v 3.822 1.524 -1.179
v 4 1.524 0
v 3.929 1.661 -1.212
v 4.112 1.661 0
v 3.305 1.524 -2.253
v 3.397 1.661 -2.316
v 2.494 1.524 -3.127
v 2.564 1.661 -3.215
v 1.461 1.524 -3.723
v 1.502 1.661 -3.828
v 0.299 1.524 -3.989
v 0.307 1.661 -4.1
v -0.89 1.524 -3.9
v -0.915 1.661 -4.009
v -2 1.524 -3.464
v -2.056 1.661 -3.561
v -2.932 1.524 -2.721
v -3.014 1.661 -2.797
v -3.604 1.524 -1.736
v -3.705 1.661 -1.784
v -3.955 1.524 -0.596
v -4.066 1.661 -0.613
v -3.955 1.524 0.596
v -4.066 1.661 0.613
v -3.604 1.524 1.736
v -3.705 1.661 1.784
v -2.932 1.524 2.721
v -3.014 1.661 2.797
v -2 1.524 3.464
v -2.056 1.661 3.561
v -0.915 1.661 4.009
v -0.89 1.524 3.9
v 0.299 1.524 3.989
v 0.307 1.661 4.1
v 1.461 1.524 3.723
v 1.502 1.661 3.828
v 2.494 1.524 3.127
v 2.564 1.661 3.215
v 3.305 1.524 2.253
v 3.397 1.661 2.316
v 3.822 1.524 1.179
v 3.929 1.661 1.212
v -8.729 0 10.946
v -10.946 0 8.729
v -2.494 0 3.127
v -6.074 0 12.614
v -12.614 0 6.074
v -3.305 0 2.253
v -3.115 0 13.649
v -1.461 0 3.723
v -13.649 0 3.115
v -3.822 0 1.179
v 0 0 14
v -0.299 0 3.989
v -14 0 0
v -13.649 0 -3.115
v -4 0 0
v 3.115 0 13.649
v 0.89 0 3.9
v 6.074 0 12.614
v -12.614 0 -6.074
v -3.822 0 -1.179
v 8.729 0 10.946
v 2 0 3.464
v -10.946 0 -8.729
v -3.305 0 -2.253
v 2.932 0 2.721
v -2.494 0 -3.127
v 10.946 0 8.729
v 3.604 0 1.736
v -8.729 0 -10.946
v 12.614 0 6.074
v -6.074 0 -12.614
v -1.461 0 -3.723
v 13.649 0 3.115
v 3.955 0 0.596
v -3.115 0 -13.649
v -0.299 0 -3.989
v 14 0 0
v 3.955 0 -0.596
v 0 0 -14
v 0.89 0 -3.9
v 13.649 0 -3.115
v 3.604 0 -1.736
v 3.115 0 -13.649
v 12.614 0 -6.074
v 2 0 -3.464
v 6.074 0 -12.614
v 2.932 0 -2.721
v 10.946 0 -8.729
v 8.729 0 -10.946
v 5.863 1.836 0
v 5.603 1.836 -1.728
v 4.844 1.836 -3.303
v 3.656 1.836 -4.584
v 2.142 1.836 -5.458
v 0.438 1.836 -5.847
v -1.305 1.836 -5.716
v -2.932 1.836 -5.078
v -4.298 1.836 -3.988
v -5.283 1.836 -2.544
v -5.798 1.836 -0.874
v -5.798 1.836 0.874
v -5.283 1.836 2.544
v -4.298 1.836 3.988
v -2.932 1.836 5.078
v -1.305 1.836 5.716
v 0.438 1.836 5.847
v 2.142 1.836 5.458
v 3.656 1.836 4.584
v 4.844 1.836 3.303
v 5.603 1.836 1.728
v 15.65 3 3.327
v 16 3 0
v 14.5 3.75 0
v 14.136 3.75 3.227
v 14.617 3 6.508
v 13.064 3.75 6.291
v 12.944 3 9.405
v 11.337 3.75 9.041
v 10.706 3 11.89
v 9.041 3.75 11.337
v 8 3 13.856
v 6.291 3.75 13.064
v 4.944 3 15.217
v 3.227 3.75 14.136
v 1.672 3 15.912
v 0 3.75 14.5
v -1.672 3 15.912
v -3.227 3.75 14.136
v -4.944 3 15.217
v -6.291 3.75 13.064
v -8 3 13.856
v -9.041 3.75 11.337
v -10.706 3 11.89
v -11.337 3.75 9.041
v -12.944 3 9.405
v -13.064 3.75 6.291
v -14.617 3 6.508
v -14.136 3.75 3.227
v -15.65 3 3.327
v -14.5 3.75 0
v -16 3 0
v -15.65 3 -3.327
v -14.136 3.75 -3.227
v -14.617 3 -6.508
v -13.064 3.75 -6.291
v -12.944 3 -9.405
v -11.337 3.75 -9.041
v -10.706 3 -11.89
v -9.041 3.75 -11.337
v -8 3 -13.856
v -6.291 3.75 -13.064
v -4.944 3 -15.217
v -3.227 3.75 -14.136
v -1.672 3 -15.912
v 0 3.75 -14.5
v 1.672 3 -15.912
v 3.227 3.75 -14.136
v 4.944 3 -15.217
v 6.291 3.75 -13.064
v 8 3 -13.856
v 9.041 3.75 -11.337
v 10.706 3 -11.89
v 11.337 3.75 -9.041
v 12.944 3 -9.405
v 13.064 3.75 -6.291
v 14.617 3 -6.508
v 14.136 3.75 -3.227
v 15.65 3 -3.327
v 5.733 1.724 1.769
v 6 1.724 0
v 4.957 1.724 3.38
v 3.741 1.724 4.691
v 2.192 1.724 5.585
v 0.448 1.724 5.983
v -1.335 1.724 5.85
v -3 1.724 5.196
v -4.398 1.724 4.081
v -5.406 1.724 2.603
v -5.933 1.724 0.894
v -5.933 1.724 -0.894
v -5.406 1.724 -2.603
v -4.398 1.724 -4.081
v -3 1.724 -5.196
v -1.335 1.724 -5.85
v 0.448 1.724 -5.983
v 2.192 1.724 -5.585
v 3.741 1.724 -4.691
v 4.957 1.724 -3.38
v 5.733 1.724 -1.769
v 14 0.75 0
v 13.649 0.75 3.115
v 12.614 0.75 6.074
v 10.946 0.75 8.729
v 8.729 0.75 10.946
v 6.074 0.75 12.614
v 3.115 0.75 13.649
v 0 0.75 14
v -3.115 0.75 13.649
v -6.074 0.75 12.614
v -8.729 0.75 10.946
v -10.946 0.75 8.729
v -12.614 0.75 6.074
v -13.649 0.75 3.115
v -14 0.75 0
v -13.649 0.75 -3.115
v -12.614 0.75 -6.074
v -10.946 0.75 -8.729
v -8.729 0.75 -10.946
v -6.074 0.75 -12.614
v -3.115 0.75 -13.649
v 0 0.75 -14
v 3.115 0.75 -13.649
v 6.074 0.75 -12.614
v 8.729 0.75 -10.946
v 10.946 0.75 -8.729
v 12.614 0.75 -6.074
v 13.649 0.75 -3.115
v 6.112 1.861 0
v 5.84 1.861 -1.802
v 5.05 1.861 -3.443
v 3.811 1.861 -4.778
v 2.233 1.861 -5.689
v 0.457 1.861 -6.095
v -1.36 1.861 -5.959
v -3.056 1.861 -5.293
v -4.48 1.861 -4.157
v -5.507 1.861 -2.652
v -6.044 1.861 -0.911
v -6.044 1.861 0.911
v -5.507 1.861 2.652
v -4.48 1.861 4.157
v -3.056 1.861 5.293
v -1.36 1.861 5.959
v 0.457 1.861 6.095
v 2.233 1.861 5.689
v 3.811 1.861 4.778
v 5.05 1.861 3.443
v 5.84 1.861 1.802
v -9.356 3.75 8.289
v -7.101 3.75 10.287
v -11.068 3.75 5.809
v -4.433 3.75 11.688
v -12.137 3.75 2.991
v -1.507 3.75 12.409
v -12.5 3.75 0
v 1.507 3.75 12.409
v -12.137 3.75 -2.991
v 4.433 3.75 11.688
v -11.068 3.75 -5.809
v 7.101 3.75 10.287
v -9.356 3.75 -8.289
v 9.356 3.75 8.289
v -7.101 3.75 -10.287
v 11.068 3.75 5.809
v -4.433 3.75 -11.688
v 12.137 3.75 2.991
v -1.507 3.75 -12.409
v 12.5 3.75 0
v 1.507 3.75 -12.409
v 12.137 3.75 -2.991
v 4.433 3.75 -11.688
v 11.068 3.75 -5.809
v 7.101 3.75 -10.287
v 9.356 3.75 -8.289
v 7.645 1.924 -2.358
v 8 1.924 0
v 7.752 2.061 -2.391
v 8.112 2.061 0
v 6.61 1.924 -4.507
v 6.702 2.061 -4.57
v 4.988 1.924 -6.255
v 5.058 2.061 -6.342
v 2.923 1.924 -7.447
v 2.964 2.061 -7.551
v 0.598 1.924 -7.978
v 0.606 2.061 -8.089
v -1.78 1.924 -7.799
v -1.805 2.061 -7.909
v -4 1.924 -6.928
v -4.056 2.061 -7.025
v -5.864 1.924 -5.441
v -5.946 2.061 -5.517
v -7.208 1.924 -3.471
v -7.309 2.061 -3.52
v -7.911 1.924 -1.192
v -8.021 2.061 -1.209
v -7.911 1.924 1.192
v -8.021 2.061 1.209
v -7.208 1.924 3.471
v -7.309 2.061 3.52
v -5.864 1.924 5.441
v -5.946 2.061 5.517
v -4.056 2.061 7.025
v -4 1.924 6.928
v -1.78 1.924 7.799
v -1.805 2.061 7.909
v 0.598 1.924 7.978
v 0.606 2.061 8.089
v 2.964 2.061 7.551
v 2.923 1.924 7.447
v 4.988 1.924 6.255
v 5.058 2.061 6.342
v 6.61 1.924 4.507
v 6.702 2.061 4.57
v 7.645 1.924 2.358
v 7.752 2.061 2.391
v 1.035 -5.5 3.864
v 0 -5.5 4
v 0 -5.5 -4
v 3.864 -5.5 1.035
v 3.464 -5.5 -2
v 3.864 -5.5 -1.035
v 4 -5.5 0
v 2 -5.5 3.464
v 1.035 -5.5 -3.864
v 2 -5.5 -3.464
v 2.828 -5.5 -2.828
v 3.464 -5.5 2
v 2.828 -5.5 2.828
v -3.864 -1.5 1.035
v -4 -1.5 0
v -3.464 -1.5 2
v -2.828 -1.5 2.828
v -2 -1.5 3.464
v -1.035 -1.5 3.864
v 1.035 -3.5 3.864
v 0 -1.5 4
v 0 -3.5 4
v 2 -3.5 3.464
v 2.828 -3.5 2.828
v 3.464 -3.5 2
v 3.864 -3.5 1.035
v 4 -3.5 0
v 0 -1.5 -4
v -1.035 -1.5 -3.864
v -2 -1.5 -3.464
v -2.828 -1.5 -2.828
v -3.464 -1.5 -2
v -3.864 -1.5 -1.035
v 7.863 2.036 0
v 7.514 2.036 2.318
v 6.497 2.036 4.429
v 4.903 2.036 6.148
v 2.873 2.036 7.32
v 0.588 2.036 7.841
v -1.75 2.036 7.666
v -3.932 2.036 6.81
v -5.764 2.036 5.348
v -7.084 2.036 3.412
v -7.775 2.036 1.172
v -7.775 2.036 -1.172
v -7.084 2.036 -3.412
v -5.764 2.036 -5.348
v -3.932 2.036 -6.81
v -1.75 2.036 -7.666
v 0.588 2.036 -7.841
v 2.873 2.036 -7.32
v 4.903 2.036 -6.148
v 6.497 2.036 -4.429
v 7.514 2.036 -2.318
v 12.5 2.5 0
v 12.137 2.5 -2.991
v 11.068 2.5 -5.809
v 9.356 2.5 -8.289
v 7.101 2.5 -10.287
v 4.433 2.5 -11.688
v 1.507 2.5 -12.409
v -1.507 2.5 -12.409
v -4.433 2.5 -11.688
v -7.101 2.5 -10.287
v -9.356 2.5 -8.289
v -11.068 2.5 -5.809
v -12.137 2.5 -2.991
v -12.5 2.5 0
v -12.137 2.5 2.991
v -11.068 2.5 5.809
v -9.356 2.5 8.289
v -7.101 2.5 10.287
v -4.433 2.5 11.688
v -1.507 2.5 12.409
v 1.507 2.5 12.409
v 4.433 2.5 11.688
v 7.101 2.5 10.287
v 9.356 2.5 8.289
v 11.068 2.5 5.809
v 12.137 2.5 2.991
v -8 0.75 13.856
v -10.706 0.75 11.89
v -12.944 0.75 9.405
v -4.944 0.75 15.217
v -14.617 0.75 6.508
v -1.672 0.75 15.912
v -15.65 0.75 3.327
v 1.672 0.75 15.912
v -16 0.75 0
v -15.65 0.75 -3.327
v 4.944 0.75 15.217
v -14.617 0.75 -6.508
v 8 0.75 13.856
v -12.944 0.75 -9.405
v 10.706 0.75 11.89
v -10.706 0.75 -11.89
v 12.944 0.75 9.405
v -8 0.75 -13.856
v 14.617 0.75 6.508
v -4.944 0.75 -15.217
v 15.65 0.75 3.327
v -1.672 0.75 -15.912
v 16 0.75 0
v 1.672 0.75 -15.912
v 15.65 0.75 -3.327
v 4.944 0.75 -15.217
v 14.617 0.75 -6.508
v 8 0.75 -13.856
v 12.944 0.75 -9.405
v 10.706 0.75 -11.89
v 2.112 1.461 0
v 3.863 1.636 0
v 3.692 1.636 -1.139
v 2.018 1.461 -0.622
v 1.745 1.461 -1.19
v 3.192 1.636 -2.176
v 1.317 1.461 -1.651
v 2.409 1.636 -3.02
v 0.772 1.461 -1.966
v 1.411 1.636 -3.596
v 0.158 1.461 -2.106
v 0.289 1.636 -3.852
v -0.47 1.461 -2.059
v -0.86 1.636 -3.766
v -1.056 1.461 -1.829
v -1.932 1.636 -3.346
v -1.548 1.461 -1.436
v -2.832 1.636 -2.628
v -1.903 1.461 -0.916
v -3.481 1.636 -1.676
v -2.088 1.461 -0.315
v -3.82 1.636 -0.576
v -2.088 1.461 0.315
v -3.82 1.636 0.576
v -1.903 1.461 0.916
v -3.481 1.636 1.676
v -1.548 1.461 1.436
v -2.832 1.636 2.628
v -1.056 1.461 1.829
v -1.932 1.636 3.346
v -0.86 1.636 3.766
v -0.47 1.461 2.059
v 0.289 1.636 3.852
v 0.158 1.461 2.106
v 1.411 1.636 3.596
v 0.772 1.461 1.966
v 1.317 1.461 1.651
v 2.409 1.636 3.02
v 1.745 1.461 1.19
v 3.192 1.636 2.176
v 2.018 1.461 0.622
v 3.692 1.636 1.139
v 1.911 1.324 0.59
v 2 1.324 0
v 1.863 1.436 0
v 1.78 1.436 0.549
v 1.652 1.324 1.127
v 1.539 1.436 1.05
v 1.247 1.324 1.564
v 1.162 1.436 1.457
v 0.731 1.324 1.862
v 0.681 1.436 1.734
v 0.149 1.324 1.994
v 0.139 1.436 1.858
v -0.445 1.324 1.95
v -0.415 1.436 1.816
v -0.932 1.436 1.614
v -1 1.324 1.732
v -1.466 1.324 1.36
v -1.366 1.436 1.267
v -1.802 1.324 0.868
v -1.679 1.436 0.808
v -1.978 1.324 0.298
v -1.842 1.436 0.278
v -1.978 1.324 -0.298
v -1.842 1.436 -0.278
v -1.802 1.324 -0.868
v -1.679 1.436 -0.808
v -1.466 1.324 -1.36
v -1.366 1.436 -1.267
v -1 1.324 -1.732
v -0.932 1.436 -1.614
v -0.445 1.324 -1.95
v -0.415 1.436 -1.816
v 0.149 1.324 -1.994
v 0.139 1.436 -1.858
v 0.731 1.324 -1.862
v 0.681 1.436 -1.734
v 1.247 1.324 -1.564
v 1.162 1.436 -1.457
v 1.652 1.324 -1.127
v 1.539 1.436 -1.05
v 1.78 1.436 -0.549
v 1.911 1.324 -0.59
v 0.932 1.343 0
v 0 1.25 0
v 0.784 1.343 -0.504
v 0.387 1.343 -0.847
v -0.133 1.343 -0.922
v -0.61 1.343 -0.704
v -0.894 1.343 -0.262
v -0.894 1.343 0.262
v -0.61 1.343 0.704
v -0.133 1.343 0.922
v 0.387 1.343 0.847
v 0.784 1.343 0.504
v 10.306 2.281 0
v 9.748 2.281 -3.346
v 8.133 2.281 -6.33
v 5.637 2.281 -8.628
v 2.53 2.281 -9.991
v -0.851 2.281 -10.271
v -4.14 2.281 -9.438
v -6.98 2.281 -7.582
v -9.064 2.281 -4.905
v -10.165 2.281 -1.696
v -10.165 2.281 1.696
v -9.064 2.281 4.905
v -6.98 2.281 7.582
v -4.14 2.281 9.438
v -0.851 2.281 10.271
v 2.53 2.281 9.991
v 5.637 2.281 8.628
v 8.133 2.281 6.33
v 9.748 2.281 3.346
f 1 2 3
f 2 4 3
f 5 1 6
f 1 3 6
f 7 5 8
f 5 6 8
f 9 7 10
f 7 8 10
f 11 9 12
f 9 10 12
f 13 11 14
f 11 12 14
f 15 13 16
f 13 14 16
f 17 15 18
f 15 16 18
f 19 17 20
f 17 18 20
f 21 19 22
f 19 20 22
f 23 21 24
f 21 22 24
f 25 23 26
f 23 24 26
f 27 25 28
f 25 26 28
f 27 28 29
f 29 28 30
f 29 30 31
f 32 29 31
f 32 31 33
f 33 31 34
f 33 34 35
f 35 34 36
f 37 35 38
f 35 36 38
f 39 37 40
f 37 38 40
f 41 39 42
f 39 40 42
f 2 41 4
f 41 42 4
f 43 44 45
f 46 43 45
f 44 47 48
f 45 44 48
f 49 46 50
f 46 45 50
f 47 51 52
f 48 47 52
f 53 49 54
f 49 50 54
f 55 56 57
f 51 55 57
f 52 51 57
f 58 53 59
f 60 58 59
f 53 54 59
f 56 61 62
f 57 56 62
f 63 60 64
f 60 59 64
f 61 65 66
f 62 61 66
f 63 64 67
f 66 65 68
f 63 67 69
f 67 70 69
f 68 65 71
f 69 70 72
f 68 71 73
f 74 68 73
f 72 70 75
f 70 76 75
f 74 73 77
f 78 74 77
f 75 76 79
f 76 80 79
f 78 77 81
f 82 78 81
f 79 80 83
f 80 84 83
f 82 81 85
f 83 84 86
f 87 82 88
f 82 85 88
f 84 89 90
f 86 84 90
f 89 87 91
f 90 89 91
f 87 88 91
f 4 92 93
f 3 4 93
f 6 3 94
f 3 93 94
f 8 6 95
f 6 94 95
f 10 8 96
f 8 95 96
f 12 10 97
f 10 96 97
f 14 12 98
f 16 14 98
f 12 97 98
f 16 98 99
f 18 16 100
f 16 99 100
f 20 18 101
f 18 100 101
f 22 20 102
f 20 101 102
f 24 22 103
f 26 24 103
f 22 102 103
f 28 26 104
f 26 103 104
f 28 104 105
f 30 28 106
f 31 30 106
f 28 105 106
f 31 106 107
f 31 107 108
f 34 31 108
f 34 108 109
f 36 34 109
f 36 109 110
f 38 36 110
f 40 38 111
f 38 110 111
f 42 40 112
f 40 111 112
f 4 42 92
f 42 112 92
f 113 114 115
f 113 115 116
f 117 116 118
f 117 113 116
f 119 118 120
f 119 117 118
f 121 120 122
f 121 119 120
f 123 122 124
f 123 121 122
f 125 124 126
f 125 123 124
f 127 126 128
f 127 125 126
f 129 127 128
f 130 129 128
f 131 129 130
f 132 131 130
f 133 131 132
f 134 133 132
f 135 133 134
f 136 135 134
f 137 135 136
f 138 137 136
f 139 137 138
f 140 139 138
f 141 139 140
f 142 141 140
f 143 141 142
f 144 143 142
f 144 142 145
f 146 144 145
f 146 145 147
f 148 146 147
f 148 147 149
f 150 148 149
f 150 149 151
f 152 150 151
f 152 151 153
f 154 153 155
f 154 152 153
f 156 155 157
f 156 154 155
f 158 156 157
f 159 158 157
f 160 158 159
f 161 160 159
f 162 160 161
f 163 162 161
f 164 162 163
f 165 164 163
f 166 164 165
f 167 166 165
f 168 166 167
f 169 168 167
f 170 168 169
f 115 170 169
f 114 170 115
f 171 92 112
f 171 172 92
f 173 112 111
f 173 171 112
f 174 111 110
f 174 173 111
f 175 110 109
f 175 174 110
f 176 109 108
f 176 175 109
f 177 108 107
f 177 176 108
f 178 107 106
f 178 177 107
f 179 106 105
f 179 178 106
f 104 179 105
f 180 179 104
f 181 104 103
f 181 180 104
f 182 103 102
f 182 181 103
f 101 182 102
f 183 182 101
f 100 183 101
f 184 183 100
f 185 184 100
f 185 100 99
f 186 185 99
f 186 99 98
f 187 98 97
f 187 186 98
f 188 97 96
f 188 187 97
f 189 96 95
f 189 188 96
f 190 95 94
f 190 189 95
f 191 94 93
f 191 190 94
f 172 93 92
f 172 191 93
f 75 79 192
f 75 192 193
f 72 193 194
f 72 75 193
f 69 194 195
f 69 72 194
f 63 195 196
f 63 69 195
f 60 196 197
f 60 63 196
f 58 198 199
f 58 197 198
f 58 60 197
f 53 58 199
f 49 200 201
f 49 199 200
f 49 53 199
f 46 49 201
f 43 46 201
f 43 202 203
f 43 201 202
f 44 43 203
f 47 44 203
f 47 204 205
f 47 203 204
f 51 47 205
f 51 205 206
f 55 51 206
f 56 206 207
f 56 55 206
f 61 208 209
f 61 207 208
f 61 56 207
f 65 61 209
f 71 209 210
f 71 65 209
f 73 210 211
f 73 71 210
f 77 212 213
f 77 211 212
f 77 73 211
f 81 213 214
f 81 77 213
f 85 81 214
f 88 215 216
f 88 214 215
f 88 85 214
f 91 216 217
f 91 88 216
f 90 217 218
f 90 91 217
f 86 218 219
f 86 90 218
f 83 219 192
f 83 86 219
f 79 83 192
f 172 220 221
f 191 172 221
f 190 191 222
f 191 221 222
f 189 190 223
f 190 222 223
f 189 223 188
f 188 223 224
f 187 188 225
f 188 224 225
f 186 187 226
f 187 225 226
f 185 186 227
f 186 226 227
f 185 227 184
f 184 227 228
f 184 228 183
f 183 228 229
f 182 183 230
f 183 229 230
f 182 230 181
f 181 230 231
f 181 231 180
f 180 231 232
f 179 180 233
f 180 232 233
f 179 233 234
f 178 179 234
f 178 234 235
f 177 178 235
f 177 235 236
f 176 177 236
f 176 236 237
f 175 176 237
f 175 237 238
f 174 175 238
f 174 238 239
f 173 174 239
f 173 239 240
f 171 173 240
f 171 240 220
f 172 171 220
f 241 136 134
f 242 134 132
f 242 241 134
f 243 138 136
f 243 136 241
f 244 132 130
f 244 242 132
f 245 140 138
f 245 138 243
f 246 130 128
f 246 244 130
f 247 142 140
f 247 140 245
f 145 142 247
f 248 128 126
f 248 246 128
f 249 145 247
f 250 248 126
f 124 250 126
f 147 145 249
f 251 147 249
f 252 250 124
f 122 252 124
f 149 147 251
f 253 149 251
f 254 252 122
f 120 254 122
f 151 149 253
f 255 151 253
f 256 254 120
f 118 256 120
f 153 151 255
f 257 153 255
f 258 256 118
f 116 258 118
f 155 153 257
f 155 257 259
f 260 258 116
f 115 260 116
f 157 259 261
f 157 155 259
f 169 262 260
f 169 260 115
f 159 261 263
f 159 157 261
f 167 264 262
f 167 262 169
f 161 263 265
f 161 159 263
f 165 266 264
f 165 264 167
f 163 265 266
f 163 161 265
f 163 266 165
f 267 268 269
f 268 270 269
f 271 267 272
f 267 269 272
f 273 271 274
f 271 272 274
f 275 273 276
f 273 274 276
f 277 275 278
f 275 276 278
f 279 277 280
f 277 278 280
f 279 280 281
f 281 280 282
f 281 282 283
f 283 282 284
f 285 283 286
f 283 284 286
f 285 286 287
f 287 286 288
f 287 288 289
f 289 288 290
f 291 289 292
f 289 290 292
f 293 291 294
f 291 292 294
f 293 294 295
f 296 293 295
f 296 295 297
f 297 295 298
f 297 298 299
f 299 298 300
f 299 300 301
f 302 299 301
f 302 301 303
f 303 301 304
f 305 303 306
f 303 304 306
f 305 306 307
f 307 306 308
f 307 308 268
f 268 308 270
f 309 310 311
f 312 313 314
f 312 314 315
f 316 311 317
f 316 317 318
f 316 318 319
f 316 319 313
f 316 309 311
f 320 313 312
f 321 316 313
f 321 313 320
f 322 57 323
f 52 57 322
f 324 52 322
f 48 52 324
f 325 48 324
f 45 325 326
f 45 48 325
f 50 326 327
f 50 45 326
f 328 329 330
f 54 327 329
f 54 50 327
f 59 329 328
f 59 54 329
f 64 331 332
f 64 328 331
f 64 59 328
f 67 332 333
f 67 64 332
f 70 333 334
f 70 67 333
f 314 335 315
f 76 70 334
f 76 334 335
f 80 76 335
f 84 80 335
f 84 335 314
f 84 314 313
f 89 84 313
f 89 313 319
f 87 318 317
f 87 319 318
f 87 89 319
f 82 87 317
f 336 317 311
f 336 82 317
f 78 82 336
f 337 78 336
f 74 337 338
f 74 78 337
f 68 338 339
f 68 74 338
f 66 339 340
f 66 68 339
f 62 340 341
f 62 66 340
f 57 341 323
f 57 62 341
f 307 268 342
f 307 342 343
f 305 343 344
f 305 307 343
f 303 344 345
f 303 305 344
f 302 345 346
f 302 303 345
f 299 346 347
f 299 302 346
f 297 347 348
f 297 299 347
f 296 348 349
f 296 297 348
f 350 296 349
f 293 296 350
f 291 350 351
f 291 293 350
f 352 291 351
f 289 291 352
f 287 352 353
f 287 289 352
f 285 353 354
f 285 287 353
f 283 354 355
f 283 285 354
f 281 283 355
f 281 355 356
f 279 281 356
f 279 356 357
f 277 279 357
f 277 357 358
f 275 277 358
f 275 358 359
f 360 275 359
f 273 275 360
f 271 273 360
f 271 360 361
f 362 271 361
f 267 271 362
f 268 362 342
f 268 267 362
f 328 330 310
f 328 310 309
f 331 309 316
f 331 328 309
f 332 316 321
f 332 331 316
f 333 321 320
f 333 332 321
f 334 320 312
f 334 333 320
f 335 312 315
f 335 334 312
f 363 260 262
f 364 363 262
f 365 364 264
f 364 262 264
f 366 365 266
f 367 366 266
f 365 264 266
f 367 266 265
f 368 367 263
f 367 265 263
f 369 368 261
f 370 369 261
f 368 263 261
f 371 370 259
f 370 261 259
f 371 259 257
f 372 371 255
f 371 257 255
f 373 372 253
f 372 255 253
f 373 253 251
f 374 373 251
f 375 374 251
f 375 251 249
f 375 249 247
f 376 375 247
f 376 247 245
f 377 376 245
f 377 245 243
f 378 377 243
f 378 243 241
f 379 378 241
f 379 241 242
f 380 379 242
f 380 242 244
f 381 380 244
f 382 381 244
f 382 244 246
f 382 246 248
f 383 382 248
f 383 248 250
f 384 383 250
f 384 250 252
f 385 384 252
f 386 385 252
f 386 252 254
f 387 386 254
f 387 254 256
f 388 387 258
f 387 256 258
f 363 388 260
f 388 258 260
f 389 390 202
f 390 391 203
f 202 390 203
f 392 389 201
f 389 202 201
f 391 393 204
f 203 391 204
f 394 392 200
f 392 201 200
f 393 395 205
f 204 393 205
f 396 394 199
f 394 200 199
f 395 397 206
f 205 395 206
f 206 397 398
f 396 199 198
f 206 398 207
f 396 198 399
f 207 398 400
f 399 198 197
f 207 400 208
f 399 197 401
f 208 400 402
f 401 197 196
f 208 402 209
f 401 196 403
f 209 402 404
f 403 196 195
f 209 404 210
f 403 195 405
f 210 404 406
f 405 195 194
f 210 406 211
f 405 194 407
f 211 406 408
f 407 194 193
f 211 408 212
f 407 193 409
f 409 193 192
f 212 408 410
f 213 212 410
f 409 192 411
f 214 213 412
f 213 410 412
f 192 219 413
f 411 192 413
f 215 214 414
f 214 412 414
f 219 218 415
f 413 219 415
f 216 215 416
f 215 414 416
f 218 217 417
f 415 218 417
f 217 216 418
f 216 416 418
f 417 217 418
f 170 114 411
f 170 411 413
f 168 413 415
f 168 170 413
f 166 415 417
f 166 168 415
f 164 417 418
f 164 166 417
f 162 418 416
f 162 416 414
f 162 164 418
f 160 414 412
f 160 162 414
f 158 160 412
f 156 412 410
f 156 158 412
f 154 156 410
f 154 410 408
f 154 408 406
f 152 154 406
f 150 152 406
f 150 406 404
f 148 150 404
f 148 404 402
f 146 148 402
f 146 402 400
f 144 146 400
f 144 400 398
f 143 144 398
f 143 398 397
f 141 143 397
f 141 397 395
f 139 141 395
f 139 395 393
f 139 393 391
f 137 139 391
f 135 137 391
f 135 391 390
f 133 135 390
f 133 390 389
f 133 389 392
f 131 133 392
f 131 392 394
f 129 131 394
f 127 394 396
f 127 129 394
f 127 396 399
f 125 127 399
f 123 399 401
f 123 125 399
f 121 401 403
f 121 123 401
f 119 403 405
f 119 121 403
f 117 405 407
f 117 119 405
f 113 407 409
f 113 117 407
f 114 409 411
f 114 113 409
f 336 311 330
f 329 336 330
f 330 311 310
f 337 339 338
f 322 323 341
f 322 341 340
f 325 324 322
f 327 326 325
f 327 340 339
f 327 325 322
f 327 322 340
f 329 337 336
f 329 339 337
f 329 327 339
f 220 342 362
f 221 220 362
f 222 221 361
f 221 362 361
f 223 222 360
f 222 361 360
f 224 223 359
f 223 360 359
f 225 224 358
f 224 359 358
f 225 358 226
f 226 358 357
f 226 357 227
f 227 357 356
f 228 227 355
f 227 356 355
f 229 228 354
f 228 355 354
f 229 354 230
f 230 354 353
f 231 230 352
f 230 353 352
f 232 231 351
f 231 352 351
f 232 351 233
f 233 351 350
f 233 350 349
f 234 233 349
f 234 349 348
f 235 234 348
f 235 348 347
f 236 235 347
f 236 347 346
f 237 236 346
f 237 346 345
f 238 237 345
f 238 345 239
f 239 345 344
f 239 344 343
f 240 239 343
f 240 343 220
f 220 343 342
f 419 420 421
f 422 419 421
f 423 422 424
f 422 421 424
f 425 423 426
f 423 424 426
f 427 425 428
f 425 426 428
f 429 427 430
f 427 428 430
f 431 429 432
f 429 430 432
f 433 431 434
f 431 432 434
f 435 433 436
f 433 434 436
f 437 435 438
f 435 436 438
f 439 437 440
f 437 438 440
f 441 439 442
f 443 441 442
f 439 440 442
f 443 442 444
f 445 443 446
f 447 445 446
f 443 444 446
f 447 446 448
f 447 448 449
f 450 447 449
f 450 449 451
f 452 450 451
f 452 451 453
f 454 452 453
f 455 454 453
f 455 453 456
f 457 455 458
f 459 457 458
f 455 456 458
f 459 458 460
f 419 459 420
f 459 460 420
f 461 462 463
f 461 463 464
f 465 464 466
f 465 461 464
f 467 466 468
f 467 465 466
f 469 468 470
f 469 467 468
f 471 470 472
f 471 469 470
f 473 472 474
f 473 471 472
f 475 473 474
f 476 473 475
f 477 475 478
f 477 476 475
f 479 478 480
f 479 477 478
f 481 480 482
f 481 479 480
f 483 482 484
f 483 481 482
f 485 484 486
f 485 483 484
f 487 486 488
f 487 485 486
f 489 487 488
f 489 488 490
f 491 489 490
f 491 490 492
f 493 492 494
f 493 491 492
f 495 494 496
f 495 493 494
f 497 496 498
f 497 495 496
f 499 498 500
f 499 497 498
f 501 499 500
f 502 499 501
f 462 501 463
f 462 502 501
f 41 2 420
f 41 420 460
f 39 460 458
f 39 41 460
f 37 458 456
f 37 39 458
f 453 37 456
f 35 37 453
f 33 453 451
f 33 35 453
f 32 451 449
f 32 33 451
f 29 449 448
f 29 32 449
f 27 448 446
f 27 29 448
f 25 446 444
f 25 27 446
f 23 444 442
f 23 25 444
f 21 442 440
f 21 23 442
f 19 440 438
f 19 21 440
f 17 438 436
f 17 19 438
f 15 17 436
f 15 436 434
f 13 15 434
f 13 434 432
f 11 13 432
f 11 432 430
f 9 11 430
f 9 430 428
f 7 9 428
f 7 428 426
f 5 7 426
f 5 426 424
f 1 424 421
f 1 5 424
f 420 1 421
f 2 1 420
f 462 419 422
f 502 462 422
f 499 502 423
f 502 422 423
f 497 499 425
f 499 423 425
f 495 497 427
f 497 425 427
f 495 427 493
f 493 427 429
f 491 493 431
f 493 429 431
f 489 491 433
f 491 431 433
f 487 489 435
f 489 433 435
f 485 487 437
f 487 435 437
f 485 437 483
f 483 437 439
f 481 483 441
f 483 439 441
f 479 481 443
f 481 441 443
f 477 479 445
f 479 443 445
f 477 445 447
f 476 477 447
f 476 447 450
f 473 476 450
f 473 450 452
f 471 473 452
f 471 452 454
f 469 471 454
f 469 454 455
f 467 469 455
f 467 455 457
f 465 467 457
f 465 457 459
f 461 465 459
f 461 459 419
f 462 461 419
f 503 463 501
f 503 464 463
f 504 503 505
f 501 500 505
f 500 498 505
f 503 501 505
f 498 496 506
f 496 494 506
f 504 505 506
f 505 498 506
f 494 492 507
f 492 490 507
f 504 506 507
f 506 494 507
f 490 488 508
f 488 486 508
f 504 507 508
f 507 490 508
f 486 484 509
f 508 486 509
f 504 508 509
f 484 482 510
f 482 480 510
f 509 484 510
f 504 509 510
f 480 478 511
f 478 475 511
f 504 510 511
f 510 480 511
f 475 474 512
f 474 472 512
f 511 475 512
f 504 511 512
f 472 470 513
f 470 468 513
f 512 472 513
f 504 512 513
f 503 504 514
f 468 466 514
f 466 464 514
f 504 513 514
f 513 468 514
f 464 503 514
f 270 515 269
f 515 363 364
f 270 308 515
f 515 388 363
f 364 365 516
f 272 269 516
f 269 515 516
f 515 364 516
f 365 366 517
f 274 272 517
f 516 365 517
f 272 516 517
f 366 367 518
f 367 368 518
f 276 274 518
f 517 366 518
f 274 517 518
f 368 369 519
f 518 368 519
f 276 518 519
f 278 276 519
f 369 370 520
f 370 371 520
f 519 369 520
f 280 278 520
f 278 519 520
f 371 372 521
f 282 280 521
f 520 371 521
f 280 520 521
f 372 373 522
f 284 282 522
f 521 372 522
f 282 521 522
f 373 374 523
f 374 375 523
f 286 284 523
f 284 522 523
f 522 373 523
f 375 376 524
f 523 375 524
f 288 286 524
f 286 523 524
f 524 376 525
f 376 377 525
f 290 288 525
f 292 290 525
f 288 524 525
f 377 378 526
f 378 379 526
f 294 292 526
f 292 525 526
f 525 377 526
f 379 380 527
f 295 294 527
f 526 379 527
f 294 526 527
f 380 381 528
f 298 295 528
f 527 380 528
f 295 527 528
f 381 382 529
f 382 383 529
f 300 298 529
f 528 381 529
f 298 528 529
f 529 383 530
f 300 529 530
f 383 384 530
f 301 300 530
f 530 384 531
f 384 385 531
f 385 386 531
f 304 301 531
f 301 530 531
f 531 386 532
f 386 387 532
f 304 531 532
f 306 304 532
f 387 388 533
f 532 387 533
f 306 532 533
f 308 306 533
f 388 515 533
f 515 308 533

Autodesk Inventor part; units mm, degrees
ref_plane "YZ Plane" through (0, 0, 0) normal (1, 0, 0) x (0, 1, 0)
ref_plane "XZ Plane" through (0, 0, 0) normal (0, 1, 0) x (-1, 0, 0)
ref_plane "XY Plane" through (0, 0, 0) normal (0, 0, 1) x (1, 0, 0)
sketch "Sketch1" plane through (0, 0, 0) normal (0, 1, 0) x (-1, 0, 0)
  circle A0 centre (0, 0) radius 4
  line L0 (0, 0) -> (4, 0) construction
  line L1 (0, 0) -> (0, -4) construction
  line L2 (0, 0) -> (-4, 0) construction
  line L3 (0, 0) -> (0, 4) construction
  dimension "d0" = 8
extrude "Extrusion1" add sketch "Sketch1" against normal blind 3.5
ref_plane "Work Plane1" through (0, 0, 0) normal (0, 0, 1) x (1, 0, 0)
sketch "Sketch2" plane through (0, 0, 0) normal (0, 0, 1) x (1, 0, 0)
  line L0 (-4, 0) -> (4, 0) projected
  line L1 (4, 0) -> (14, 0)
  line L2 (16, 0.75) -> (16, 3)
  line L3 (14.5, 3.75) -> (12.5, 3.75)
  line L4 (0, 0) -> (0, 1.25)
  line L5 (4, 0) -> (4, 1.5959) construction
  line L6 (16, 0.75) -> (14, 0.75)
  line L7 (14, 0.75) -> (14, 0)
  line L8 (16, 3) -> (14.5, 3.75)
  line L9 (12.5, 2.5) -> (12.5, 3.75)
  line L10 (5.8632, 1.8363) -> (6, 1.7244)
  line L11 (6, 1.7244) -> (6.1119, 1.8612)
  line L12 (4.1119, 1.6612) -> (4, 1.5244)
  line L13 (4, 1.5244) -> (3.8632, 1.6363)
  line L14 (1.8632, 1.4363) -> (2, 1.3244)
  line L15 (2, 1.3244) -> (2.1119, 1.4612)
  line L16 (0, 1.25) -> (1.8632, 1.4363)
  line L17 (2.1119, 1.4612) -> (3.8632, 1.6363)
  line L18 (4.1119, 1.6612) -> (5.8632, 1.8363)
  line L19 (4, 1.5244) -> (4, 3.125) construction
  line L20 (6, 1.7244) -> (6, 3.125) construction
  line L21 (6, 3.125) -> (4, 3.125) construction
  line L22 (4, 3.125) -> (2, 3.125) construction
  line L23 (2, 3.125) -> (0, 3.125) construction
  line L24 (1.8632, 1.4363) -> (2.1119, 1.4612) construction
  line L25 (3.8632, 1.6363) -> (4.1119, 1.6612) construction
  line L26 (5.8632, 1.8363) -> (6.1119, 1.8612) construction
  line L27 (1.9876, 1.4488) -> (2, 1.3244) construction
  line L28 (4, 1.65) -> (4, 1.5244) construction
  line L29 (2, 1.3244) -> (2, 3.125) construction
  line L30 (7.8632, 2.0363) -> (8, 1.9244)
  line L31 (8, 1.9244) -> (8.1119, 2.0612)
  line L32 (8, 1.9244) -> (8, 3.125) construction
  line L33 (6.1119, 1.8612) -> (7.8632, 2.0363)
  line L34 (8.1119, 2.0612) -> (12.5, 2.5)
  line L35 (8, 3.125) -> (6, 3.125) construction
  line L36 (8, 3.125) -> (12.5, 3.125) construction
  point P0 (6, 1.85)
  dimension "d8" = 16
  dimension "d11" = 14
  dimension "d12" = 0.75
  dimension "d13" = 3
  dimension "d14" = 0.75
  dimension "d15" = 1.5
  dimension "d16" = 1.25
  dimension "d19" = 3.5
  dimension "d23" = 1.25
  dimension "d25" = 0.125
  dimension "d26" = 2
  dimension "d32" = 2
revolve "Revolution1" add sketch "Sketch2" angle 360 about axis through (0, 0, 0) along (0, 1, 0)
sketch "Sketch3" plane through (0, -3.5, 0) normal (0, -1, 0) x (1, 0, 0)
  point P0 (0, 0)
  point P1 (0, 0)
sketch "Sketch4" plane through (0, -3.5, 0) normal (0, -1, 0) x (1, 0, 0)
  circle A0 centre (0, 0) radius 4 projected
  circle A1 centre (0, 0) radius 4 projected
  arc A2 (0, -4) -> (0, 4) centre (0, 0) ccw
  line L0 (0, 4) -> (0, -4)
extrude "Extrusion2" add sketch "Sketch4" along normal blind 2 contours A0 L0 picked at (0.5785, 1.2013)
sketch "Sketch5" plane through (0, -3.5, 0) normal (0, -1, 0) x (1, 0, 0)
  line L0 (0, -4) -> (0, 4) projected
  arc A0 (0, 4) -> (0, -4) centre (0, 0) ccw projected
extrude "Extrusion3" cut sketch "Sketch5" against normal blind 2
properties part number "Caps 8mm Square Rounded Caps Male2"
